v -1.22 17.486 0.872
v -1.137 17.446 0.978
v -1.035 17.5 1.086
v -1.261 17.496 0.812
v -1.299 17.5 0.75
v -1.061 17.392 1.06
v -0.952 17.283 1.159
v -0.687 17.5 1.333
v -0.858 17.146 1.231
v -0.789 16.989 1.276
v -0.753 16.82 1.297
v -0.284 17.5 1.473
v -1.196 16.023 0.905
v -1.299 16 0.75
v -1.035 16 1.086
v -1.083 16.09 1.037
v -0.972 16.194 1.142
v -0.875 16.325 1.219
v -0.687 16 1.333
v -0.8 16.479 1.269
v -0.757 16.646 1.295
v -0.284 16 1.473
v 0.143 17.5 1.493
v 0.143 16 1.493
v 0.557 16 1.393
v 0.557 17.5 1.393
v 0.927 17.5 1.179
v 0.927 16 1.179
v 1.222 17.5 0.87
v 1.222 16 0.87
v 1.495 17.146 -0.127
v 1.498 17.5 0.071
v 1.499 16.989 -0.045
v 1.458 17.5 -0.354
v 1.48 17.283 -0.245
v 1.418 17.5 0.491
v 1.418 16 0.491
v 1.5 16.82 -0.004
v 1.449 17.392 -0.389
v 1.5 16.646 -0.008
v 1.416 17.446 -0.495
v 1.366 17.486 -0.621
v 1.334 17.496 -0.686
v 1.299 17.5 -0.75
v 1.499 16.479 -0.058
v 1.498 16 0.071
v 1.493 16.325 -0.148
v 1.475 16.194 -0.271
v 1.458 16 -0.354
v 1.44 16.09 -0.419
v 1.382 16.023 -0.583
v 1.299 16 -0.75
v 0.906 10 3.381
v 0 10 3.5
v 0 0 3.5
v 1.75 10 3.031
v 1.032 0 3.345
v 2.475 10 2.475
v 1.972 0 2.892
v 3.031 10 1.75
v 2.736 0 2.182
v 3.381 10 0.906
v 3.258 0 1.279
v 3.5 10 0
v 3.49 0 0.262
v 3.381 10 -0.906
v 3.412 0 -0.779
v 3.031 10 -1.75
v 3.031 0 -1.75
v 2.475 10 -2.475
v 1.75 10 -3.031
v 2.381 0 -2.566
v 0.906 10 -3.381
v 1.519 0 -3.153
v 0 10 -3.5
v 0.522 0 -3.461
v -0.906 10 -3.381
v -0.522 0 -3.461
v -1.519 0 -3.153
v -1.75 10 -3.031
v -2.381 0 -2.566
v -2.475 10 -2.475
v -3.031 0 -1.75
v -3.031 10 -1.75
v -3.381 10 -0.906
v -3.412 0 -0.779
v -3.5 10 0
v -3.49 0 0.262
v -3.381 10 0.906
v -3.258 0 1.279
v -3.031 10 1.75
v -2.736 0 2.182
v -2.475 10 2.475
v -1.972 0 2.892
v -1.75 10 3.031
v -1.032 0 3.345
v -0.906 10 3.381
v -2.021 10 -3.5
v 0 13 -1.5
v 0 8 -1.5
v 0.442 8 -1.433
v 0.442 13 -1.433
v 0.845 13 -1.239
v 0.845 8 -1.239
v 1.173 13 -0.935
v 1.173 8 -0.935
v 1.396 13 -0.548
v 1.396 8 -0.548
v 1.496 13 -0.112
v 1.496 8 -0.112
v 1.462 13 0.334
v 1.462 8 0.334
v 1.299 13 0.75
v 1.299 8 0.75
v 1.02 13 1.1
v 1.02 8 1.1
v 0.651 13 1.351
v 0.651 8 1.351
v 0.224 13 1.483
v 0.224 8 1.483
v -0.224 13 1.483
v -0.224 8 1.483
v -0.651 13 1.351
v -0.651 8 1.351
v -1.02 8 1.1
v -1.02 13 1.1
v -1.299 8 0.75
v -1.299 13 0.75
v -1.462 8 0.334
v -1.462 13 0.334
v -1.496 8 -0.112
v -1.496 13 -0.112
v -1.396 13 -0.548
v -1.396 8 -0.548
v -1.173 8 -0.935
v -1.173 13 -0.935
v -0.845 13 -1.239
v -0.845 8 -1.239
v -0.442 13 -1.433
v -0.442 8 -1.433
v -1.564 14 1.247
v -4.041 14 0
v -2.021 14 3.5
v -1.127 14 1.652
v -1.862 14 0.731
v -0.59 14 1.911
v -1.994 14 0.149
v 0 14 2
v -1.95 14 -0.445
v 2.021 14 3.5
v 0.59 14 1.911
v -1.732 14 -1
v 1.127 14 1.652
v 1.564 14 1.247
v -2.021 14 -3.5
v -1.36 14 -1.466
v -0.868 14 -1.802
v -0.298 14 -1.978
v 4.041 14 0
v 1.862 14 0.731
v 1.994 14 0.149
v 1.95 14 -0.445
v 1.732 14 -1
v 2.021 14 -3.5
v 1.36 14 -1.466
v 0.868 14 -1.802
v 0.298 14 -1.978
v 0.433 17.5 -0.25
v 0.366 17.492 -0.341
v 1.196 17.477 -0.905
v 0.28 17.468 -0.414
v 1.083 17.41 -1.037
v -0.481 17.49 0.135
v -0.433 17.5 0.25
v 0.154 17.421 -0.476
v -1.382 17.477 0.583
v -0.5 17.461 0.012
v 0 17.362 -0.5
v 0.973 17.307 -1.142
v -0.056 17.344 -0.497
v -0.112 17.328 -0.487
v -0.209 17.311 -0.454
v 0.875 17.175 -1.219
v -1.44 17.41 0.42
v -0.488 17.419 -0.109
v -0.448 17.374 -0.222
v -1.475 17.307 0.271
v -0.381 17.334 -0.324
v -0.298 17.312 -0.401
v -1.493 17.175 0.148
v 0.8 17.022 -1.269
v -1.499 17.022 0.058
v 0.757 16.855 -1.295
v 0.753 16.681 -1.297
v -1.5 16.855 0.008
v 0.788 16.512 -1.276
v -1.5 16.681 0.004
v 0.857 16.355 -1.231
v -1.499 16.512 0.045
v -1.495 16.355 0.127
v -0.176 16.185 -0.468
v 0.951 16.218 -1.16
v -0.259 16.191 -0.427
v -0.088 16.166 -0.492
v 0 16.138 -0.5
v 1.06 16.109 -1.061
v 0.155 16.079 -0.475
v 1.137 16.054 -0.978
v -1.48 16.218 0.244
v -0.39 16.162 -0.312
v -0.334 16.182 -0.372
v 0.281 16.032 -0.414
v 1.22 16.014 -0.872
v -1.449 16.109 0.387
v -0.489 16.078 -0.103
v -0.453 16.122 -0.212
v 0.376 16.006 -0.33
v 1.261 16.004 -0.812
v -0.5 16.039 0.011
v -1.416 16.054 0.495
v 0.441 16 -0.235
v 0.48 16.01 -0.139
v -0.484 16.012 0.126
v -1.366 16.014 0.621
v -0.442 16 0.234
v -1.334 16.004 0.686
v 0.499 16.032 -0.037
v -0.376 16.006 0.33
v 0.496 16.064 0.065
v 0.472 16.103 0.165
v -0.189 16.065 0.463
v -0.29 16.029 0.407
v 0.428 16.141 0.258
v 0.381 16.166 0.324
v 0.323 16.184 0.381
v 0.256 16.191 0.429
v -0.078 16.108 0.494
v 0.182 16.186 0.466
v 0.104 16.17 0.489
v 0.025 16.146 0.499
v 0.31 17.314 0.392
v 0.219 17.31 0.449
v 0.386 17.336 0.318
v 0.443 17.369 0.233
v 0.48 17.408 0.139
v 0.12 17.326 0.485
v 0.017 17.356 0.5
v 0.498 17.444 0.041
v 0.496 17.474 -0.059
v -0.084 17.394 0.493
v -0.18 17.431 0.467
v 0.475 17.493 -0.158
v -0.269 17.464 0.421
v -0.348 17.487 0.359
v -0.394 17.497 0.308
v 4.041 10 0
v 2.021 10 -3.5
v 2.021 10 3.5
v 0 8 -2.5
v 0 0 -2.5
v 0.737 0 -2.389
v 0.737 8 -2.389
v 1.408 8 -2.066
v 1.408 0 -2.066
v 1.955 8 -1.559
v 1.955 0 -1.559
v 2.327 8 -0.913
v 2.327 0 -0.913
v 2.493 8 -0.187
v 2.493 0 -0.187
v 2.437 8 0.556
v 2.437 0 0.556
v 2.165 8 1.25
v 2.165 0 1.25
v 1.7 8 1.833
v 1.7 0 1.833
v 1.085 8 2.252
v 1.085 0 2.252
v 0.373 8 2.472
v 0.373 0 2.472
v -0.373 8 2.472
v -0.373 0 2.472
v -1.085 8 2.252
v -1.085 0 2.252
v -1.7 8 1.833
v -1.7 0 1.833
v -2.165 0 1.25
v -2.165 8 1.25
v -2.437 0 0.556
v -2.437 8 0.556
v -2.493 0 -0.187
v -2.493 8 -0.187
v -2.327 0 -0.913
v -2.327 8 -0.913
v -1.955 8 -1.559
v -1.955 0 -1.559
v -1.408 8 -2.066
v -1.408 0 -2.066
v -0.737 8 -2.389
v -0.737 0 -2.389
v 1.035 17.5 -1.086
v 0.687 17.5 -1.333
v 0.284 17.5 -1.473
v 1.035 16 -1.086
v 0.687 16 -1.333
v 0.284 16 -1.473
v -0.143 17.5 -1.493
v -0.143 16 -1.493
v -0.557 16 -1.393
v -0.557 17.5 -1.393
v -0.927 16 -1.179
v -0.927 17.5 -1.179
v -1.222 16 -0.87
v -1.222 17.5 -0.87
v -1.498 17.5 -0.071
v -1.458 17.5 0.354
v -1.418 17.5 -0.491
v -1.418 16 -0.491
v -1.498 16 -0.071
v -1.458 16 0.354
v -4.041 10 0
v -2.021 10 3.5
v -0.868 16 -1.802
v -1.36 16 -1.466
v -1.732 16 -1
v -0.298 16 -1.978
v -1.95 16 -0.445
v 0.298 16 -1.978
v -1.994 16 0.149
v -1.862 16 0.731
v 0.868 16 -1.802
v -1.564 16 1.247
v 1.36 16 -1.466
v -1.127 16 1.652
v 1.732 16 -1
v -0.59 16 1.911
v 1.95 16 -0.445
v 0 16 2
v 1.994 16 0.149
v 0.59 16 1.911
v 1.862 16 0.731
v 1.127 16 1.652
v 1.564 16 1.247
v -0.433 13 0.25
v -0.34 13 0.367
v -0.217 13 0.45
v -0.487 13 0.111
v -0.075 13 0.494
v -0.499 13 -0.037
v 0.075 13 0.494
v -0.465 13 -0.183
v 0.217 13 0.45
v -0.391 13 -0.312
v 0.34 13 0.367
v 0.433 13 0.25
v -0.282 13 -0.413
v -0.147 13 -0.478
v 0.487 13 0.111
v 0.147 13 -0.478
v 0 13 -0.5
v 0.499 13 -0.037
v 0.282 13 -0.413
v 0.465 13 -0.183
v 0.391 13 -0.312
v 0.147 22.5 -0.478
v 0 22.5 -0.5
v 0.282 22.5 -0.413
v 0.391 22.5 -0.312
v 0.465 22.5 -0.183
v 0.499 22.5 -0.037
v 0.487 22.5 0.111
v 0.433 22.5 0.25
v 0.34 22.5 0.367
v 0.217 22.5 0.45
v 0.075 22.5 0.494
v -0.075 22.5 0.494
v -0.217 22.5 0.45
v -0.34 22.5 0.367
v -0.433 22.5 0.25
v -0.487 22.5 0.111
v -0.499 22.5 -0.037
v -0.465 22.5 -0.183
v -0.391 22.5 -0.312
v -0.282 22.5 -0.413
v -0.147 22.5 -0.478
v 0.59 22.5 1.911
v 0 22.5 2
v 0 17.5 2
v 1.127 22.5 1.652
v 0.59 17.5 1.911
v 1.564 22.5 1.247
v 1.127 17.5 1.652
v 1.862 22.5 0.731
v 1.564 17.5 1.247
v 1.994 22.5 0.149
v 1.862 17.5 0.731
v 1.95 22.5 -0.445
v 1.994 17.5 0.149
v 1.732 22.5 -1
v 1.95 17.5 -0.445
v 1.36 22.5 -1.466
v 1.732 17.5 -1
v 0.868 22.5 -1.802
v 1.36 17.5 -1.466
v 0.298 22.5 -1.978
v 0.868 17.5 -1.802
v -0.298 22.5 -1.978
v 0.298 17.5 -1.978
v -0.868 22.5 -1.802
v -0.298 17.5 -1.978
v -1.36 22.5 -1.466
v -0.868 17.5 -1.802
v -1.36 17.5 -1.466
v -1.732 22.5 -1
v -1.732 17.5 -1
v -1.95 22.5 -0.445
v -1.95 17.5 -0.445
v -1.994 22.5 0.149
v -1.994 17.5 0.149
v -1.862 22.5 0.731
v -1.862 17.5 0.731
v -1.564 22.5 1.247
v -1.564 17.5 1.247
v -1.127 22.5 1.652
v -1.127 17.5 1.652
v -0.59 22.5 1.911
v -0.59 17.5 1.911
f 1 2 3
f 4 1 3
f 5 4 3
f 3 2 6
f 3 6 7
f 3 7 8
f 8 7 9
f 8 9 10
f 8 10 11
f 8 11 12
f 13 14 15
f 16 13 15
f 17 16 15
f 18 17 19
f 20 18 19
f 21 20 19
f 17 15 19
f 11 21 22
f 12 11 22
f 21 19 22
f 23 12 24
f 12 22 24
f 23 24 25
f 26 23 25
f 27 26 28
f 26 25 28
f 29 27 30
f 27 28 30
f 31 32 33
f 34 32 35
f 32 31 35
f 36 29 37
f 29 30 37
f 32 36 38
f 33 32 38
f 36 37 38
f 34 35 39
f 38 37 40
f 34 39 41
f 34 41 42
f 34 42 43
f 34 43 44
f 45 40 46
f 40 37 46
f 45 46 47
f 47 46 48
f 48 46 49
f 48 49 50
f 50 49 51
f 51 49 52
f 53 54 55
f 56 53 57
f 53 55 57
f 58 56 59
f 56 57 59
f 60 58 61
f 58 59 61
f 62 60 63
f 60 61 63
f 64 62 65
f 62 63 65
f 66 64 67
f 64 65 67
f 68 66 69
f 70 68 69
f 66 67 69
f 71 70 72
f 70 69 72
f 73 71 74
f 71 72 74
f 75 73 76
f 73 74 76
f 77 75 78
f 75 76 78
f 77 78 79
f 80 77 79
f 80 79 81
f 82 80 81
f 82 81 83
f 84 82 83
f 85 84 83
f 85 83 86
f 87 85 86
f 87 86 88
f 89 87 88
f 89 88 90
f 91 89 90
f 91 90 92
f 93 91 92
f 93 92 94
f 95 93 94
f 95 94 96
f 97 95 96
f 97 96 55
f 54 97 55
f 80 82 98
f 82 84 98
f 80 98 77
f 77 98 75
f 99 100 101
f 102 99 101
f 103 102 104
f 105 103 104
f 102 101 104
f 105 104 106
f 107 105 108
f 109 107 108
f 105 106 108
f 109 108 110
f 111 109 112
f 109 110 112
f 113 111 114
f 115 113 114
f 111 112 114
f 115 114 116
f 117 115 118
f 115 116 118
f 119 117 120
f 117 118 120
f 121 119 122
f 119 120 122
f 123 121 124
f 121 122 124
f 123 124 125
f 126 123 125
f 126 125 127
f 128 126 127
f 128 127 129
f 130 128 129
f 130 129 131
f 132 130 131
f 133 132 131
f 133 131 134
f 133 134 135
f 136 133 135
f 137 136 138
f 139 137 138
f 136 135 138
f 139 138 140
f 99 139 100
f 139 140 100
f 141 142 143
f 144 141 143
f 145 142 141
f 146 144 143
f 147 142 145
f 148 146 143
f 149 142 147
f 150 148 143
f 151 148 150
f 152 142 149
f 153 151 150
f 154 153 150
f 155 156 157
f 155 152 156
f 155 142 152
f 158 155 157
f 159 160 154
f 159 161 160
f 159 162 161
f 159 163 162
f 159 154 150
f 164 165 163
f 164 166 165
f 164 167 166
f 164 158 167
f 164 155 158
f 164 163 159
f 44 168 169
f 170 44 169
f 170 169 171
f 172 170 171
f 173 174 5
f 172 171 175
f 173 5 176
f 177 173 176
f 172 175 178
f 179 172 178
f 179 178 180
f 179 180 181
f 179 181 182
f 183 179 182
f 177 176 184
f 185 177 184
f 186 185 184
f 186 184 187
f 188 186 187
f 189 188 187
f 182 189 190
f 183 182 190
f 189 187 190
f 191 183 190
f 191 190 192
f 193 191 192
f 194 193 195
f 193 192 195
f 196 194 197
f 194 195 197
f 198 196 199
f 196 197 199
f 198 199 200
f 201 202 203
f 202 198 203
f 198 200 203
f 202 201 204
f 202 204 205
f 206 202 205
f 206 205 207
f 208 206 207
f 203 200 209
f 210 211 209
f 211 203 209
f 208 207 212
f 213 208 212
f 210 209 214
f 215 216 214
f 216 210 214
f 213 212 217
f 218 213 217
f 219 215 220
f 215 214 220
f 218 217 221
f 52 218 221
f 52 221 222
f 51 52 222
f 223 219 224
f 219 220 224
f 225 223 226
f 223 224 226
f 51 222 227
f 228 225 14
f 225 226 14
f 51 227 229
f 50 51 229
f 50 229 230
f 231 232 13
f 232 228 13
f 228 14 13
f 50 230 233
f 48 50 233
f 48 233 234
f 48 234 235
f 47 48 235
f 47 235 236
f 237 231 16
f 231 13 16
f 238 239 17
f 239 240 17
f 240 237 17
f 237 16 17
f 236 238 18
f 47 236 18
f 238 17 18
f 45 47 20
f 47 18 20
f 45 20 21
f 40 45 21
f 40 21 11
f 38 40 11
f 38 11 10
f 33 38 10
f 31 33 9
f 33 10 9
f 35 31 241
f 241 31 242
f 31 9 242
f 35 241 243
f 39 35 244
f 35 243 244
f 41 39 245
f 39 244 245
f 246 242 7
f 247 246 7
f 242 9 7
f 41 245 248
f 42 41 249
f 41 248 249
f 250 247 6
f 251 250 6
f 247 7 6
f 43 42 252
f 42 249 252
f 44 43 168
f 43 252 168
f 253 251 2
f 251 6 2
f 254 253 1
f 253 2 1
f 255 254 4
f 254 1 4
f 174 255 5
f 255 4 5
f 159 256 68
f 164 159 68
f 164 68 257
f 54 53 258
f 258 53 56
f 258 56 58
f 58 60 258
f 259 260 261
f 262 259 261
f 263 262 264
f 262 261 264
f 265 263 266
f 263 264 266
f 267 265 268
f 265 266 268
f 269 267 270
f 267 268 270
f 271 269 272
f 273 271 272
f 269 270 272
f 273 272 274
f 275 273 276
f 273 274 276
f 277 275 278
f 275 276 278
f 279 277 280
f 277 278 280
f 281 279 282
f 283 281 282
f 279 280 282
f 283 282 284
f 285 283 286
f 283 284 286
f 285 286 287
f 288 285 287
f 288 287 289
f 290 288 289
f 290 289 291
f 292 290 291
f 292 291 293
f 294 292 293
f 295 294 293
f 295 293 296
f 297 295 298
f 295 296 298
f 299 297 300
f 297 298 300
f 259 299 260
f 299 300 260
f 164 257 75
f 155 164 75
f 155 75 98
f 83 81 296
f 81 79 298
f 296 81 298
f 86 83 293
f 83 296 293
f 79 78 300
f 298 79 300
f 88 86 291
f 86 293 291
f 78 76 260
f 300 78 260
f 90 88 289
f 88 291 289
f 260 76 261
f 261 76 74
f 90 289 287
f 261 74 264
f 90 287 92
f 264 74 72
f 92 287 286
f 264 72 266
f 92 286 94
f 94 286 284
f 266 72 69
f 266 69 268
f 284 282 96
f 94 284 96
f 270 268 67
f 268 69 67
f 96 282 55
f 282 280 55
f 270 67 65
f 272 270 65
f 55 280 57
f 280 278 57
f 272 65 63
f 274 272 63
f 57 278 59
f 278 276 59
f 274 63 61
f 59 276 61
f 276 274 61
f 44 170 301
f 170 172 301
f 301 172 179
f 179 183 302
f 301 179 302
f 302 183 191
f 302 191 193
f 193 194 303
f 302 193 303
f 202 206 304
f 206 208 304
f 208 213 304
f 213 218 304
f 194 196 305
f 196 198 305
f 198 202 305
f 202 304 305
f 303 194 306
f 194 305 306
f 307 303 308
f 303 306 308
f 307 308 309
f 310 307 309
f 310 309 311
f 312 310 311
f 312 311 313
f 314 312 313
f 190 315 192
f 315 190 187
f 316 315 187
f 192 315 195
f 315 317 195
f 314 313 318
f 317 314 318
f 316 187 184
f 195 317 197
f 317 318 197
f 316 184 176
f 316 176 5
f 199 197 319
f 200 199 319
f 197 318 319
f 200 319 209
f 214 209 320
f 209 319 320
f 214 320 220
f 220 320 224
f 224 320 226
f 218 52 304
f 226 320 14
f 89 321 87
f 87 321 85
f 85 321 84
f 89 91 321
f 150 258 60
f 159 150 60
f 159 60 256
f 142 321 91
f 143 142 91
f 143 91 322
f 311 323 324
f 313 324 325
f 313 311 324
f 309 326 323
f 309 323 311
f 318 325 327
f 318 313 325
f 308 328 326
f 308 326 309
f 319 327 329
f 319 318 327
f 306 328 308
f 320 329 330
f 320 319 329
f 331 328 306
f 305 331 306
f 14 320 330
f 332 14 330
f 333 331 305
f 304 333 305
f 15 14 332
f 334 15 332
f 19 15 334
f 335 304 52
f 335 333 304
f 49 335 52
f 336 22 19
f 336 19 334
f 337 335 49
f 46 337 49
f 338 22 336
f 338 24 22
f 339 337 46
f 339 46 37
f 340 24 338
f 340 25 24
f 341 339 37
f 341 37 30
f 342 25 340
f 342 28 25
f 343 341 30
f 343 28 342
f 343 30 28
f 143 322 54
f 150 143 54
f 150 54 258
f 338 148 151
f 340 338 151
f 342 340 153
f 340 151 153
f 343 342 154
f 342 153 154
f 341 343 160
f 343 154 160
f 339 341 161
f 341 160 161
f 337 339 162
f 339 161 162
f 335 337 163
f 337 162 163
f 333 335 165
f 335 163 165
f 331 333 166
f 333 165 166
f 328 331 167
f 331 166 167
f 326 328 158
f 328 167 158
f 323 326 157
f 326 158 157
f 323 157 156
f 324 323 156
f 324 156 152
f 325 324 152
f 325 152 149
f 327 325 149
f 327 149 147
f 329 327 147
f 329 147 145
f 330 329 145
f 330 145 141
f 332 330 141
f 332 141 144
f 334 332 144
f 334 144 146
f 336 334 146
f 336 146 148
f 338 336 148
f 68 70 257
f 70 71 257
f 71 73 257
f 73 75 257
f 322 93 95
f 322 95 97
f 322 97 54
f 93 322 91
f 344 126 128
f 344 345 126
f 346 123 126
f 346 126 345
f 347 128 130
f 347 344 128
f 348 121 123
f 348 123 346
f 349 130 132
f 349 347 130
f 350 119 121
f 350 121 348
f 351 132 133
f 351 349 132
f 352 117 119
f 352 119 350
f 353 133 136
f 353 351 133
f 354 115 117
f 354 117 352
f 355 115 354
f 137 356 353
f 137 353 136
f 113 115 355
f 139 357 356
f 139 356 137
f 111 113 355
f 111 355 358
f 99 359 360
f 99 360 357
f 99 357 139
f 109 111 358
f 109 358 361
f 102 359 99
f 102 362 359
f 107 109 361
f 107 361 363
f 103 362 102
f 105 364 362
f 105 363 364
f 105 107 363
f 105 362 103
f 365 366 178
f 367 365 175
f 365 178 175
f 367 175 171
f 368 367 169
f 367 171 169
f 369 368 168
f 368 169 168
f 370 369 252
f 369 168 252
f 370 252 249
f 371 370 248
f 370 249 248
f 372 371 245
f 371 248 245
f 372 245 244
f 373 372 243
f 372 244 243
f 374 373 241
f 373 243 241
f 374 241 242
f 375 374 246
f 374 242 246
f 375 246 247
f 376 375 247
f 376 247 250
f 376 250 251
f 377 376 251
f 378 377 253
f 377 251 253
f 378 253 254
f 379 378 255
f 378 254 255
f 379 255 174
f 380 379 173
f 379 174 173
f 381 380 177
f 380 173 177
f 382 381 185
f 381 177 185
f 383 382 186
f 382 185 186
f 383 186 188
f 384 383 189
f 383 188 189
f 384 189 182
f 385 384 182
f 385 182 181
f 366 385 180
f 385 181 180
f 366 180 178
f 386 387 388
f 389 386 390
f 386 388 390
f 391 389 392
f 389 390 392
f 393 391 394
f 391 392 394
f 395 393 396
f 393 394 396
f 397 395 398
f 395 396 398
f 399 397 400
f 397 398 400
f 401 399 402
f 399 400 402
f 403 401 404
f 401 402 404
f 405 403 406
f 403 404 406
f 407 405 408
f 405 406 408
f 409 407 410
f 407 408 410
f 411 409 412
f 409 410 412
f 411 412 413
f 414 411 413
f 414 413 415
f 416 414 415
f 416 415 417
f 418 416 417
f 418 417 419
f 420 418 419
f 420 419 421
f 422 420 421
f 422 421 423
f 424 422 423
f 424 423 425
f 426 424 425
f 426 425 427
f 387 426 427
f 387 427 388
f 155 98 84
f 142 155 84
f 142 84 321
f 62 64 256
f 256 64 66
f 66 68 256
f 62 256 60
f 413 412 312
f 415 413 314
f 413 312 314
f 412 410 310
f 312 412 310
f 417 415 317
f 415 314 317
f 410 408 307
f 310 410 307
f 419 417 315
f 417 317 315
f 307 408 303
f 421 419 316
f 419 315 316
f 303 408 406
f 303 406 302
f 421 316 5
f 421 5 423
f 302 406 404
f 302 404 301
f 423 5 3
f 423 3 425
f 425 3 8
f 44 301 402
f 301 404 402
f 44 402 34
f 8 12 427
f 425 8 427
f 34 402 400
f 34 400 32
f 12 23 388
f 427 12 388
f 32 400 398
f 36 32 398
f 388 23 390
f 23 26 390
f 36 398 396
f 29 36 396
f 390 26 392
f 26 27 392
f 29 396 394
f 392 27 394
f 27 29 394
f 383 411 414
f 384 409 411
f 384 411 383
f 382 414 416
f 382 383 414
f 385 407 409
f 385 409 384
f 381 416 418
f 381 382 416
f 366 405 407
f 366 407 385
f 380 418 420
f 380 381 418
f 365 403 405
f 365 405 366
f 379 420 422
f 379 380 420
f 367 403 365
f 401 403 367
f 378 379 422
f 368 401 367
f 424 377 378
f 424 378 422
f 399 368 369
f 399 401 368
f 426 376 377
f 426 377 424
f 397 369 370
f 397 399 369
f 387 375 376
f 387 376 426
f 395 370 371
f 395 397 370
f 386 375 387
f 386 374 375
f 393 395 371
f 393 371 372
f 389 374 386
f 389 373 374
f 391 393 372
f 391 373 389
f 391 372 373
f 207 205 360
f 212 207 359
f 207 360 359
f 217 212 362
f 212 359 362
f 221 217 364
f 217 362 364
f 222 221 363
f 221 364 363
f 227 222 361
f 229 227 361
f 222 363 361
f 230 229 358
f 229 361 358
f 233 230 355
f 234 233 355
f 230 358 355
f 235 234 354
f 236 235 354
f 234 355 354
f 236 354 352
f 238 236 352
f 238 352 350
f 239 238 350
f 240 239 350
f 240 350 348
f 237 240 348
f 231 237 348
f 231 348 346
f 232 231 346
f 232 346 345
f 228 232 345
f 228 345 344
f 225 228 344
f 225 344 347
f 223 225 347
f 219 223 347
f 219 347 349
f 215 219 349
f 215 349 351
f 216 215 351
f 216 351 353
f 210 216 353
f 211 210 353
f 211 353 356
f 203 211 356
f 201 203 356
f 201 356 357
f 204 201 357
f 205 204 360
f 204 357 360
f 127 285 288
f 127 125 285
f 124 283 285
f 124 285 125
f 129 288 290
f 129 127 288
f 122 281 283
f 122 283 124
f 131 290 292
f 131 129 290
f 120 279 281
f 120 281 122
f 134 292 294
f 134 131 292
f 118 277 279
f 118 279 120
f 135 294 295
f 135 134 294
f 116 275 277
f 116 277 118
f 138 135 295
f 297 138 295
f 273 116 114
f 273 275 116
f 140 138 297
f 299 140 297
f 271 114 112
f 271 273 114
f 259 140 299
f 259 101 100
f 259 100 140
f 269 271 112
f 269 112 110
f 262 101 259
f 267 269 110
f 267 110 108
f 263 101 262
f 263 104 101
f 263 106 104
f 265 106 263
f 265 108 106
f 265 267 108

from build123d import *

# Parameters (mm, degrees)
SKETCH1_R           = 3.5
BOSS_EXTRUDE1_DEPTH = 10
BOSS_EXTRUDE2_DEPTH = 4
SKETCH3_R           = 2
BOSS_EXTRUDE3_DEPTH = 2
SKETCH4_R           = 1.5
BOSS_EXTRUDE4_DEPTH = 1.5
SKETCH5_R           = 2
BOSS_EXTRUDE5_DEPTH = 5
SKETCH6_R           = 0.75
CUT_EXTRUDE1_DEPTH  = 5
SKETCH7_R           = 2.5
CUT_EXTRUDE2_DEPTH  = 8
SKETCH8_R           = 1.5
CUT_EXTRUDE4_DEPTH  = 5
SKETCH9_R           = 0.5
CUT_EXTRUDE5_DEPTH  = 15.056433877


with BuildPart() as part:
    # Sketch1 → Boss-Extrude1 (new body)
    with BuildSketch(Plane(origin=(0, 0, 0), x_dir=(1, 0, 0), z_dir=(0, 1, 0))):
        with Locations(Location((0, 0, 0), (0, 0, 270))):
            Circle(SKETCH1_R)
    extrude(amount=BOSS_EXTRUDE1_DEPTH)

    # Sketch2 → Boss-Extrude2 (add)
    with BuildSketch(Plane(origin=(0, 10, 0), x_dir=(1, 0, 0), z_dir=(0, 1, 0))):
        Polygon((2.020725942, 3.5), (-2.020725942, 3.5), (-4.041451884, 0), (-2.020725942, -3.5), (2.020725942, -3.5), (4.041451884, 0), align=None)
    extrude(amount=BOSS_EXTRUDE2_DEPTH)

    # Sketch3 → Boss-Extrude3 (add)
    with BuildSketch(Plane(origin=(0, 14, 0), x_dir=(1, 0, 0), z_dir=(0, 1, 0))):
        with Locations(Location((0, 0, 0), (0, 0, 270))):
            Circle(SKETCH3_R)
    extrude(amount=BOSS_EXTRUDE3_DEPTH)

    # Sketch4 → Boss-Extrude4 (add)
    with BuildSketch(Plane(origin=(0, 16, 0), x_dir=(1, 0, 0), z_dir=(0, 1, 0))):
        with Locations(Location((0, 0, 0), (0, 0, 270))):
            Circle(SKETCH4_R)
    extrude(amount=BOSS_EXTRUDE4_DEPTH)

    # Sketch5 → Boss-Extrude5 (add)
    with BuildSketch(Plane(origin=(0, 17.5, 0), x_dir=(1, 0, 0), z_dir=(0, 1, 0))):
        with Locations(Location((0, 0, 0), (0, 0, 270))):
            Circle(SKETCH5_R)
    extrude(amount=BOSS_EXTRUDE5_DEPTH)

    # Sketch6 → Cut-Extrude1 (cut)
    with BuildSketch(Plane(origin=(-1.299038106, 0, 0.75), x_dir=(0.5000000000000026, 0, 0.8660254037844373), z_dir=(-0.8660254037844373, 0, 0.5000000000000026))):
        with Locations(Location((0, 16.75, 0), (0, 0, 90))):
            Circle(SKETCH6_R)
    extrude(amount=-CUT_EXTRUDE1_DEPTH, mode=Mode.SUBTRACT)

    # Sketch7 → Cut-Extrude2 (cut)
    with BuildSketch(Plane.XZ):
        with Locations(Location((0, 0, 0), (0, 0, 270))):
            Circle(SKETCH7_R)
    extrude(amount=-CUT_EXTRUDE2_DEPTH, mode=Mode.SUBTRACT)

    # Sketch8 → Cut-Extrude4 (cut)
    with BuildSketch(Plane.XZ.offset(-8)):
        with Locations(Location((0, 0, 0), (0, 0, 270))):
            Circle(SKETCH8_R)
    extrude(amount=-CUT_EXTRUDE4_DEPTH, mode=Mode.SUBTRACT)

    # Sketch9 → Cut-Extrude5 (cut, through all)
    with BuildSketch(Plane.XZ.offset(-13)):
        with Locations(Location((0, 0, 0), (0, 0, 270))):
            Circle(SKETCH9_R)
    extrude(amount=-CUT_EXTRUDE5_DEPTH, mode=Mode.SUBTRACT)


solid = part.part
